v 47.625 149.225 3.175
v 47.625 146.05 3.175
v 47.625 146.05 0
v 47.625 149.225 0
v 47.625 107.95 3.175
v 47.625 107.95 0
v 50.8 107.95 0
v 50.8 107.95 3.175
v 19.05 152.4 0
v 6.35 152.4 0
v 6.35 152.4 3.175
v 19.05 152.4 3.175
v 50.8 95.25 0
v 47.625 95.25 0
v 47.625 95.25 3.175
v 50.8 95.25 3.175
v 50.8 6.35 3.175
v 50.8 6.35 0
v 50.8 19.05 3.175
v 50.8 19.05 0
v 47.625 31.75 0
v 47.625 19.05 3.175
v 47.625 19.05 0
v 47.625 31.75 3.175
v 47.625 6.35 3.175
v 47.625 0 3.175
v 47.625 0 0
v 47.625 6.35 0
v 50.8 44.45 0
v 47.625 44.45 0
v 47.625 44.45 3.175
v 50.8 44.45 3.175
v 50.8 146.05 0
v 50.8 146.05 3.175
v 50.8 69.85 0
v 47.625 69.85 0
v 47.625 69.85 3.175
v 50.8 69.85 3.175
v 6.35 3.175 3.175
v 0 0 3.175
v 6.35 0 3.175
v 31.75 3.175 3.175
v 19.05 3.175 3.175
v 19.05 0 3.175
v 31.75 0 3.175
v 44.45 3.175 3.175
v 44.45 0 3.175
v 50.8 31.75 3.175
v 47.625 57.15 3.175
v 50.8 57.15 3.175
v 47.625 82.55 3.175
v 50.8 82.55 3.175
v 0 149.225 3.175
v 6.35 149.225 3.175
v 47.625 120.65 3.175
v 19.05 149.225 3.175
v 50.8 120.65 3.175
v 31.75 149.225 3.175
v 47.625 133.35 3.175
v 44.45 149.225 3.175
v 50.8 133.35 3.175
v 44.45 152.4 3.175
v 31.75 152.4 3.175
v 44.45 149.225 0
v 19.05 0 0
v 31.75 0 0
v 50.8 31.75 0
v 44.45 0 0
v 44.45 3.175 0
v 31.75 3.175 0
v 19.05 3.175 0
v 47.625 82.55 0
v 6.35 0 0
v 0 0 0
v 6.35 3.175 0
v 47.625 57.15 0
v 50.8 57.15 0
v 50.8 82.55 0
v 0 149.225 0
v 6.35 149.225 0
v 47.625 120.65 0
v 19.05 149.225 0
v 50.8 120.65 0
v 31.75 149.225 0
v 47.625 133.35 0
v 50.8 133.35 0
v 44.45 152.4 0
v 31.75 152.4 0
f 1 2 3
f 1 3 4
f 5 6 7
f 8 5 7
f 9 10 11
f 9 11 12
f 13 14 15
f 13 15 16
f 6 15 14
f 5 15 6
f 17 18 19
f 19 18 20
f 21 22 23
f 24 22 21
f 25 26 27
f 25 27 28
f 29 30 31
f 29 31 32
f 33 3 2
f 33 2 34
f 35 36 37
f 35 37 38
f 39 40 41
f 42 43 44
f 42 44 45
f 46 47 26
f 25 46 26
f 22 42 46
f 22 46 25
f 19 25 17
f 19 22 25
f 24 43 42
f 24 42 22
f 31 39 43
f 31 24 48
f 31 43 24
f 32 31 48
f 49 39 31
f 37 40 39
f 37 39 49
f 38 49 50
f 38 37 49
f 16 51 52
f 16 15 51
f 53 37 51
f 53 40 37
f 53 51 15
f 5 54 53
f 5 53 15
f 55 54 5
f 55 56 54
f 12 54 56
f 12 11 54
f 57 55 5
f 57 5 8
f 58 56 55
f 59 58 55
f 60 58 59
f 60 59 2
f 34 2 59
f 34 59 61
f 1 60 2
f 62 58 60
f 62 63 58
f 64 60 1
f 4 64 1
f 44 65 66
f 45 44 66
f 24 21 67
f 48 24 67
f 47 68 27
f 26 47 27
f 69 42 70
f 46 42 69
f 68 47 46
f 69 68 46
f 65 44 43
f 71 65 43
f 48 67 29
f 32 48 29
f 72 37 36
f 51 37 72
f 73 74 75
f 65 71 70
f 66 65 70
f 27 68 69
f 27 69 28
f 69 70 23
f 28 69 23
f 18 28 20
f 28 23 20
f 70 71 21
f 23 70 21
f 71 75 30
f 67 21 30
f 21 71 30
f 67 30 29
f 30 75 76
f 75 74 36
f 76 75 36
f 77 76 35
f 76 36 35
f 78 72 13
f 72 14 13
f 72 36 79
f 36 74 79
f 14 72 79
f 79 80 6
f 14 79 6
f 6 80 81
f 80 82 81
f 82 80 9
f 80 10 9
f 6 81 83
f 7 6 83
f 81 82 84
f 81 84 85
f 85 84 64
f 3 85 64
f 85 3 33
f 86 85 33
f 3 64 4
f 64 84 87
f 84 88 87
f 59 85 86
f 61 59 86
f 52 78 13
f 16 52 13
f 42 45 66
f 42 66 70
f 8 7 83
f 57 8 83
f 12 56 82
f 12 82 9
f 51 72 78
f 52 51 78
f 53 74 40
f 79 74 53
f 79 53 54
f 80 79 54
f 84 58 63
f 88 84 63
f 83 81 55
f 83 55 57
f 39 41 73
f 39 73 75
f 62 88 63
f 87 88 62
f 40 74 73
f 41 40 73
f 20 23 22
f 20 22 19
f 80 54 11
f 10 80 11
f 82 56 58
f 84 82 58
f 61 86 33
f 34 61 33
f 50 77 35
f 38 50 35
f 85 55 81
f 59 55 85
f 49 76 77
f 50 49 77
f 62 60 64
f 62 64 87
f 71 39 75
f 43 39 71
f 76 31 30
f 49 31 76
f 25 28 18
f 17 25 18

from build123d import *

# Parameters (mm, degrees)
SKETCH1_W          = 50.8
SKETCH1_H          = 152.4
EXTRUDE1_DEPTH     = 3.175
SKETCH3_W          = 3.175
SKETCH3_H          = 6.35
CUT_EXTRUDE1_DEPTH = 3.175
LPATTERN1_COUNT    = 2
LPATTERN1_PITCH    = 146.05
SKETCH4_W          = 3.175
SKETCH4_H          = 12.7
CUT_EXTRUDE2_DEPTH = 3.175
LPATTERN2_COUNT    = 5
LPATTERN2_PITCH    = 25.4
SKETCH5_W          = 12.7
SKETCH5_H          = 3.175
CUT_EXTRUDE3_DEPTH = 3.175
SKETCH6_W          = 6.35
SKETCH6_H          = 3.175
CUT_EXTRUDE4_DEPTH = 3.175
LPATTERN3_COUNT    = 2
LPATTERN3_PITCH    = 44.45
LPATTERN4_COUNT    = 2
LPATTERN4_PITCH    = 25.4
SKETCH7_W          = 12.7
SKETCH7_H          = 3.175
CUT_EXTRUDE5_DEPTH = 4.175


with BuildPart() as part:
    # Sketch1 → Extrude1 (new body)
    with BuildSketch(Plane.XY):
        with Locations((25.4, 76.2)):
            Rectangle(SKETCH1_W, SKETCH1_H)
    extrude(amount=EXTRUDE1_DEPTH)

    # Sketch3 → Cut-Extrude1 (cut)
    with BuildSketch(Plane.XY.offset(3.175)):
        with Locations((49.2125, 149.225)):
            Rectangle(SKETCH3_W, SKETCH3_H)
    cut_extrude1 = extrude(amount=-CUT_EXTRUDE1_DEPTH, mode=Mode.SUBTRACT)

    # LPattern1: Cut-Extrude1 ×2
    with Locations(*[(0, -i * LPATTERN1_PITCH, 0) for i in range(1, LPATTERN1_COUNT)]):
        add(cut_extrude1, mode=Mode.SUBTRACT)

    # Sketch4 → Cut-Extrude2 (cut)
    with BuildSketch(Plane.XY.offset(3.175)):
        with Locations((49.2125, 127)):
            Rectangle(SKETCH4_W, SKETCH4_H)
    cut_extrude2 = extrude(amount=-CUT_EXTRUDE2_DEPTH, mode=Mode.SUBTRACT)

    # LPattern2: Cut-Extrude2 ×5
    with Locations(*[(0, -i * LPATTERN2_PITCH, 0) for i in range(1, LPATTERN2_COUNT)]):
        add(cut_extrude2, mode=Mode.SUBTRACT)

    # Sketch5 → Cut-Extrude3 (cut)
    with BuildSketch(Plane.XY.offset(3.175)):
        with Locations((12.7, 1.5875)):
            Rectangle(SKETCH5_W, SKETCH5_H)
    cut_extrude3 = extrude(amount=-CUT_EXTRUDE3_DEPTH, mode=Mode.SUBTRACT)

    # Sketch6 → Cut-Extrude4 (cut)
    with BuildSketch(Plane.XY.offset(3.175)):
        with Locations((3.175, 150.8125)):
            Rectangle(SKETCH6_W, SKETCH6_H)
    cut_extrude4 = extrude(amount=-CUT_EXTRUDE4_DEPTH, mode=Mode.SUBTRACT)

    # LPattern3: Cut-Extrude4 ×2
    with Locations(*[(i * LPATTERN3_PITCH, 0, 0) for i in range(1, LPATTERN3_COUNT)]):
        add(cut_extrude4, mode=Mode.SUBTRACT)

    # LPattern4: Cut-Extrude3 ×2
    with Locations(*[(i * LPATTERN4_PITCH, 0, 0) for i in range(1, LPATTERN4_COUNT)]):
        add(cut_extrude3, mode=Mode.SUBTRACT)

    # Sketch7 → Cut-Extrude5 (cut, through all)
    with BuildSketch(Plane.XY.offset(3.175)):
        with Locations((25.4, 150.8125)):
            Rectangle(SKETCH7_W, SKETCH7_H)
    extrude(amount=-CUT_EXTRUDE5_DEPTH, mode=Mode.SUBTRACT)


solid = part.part
